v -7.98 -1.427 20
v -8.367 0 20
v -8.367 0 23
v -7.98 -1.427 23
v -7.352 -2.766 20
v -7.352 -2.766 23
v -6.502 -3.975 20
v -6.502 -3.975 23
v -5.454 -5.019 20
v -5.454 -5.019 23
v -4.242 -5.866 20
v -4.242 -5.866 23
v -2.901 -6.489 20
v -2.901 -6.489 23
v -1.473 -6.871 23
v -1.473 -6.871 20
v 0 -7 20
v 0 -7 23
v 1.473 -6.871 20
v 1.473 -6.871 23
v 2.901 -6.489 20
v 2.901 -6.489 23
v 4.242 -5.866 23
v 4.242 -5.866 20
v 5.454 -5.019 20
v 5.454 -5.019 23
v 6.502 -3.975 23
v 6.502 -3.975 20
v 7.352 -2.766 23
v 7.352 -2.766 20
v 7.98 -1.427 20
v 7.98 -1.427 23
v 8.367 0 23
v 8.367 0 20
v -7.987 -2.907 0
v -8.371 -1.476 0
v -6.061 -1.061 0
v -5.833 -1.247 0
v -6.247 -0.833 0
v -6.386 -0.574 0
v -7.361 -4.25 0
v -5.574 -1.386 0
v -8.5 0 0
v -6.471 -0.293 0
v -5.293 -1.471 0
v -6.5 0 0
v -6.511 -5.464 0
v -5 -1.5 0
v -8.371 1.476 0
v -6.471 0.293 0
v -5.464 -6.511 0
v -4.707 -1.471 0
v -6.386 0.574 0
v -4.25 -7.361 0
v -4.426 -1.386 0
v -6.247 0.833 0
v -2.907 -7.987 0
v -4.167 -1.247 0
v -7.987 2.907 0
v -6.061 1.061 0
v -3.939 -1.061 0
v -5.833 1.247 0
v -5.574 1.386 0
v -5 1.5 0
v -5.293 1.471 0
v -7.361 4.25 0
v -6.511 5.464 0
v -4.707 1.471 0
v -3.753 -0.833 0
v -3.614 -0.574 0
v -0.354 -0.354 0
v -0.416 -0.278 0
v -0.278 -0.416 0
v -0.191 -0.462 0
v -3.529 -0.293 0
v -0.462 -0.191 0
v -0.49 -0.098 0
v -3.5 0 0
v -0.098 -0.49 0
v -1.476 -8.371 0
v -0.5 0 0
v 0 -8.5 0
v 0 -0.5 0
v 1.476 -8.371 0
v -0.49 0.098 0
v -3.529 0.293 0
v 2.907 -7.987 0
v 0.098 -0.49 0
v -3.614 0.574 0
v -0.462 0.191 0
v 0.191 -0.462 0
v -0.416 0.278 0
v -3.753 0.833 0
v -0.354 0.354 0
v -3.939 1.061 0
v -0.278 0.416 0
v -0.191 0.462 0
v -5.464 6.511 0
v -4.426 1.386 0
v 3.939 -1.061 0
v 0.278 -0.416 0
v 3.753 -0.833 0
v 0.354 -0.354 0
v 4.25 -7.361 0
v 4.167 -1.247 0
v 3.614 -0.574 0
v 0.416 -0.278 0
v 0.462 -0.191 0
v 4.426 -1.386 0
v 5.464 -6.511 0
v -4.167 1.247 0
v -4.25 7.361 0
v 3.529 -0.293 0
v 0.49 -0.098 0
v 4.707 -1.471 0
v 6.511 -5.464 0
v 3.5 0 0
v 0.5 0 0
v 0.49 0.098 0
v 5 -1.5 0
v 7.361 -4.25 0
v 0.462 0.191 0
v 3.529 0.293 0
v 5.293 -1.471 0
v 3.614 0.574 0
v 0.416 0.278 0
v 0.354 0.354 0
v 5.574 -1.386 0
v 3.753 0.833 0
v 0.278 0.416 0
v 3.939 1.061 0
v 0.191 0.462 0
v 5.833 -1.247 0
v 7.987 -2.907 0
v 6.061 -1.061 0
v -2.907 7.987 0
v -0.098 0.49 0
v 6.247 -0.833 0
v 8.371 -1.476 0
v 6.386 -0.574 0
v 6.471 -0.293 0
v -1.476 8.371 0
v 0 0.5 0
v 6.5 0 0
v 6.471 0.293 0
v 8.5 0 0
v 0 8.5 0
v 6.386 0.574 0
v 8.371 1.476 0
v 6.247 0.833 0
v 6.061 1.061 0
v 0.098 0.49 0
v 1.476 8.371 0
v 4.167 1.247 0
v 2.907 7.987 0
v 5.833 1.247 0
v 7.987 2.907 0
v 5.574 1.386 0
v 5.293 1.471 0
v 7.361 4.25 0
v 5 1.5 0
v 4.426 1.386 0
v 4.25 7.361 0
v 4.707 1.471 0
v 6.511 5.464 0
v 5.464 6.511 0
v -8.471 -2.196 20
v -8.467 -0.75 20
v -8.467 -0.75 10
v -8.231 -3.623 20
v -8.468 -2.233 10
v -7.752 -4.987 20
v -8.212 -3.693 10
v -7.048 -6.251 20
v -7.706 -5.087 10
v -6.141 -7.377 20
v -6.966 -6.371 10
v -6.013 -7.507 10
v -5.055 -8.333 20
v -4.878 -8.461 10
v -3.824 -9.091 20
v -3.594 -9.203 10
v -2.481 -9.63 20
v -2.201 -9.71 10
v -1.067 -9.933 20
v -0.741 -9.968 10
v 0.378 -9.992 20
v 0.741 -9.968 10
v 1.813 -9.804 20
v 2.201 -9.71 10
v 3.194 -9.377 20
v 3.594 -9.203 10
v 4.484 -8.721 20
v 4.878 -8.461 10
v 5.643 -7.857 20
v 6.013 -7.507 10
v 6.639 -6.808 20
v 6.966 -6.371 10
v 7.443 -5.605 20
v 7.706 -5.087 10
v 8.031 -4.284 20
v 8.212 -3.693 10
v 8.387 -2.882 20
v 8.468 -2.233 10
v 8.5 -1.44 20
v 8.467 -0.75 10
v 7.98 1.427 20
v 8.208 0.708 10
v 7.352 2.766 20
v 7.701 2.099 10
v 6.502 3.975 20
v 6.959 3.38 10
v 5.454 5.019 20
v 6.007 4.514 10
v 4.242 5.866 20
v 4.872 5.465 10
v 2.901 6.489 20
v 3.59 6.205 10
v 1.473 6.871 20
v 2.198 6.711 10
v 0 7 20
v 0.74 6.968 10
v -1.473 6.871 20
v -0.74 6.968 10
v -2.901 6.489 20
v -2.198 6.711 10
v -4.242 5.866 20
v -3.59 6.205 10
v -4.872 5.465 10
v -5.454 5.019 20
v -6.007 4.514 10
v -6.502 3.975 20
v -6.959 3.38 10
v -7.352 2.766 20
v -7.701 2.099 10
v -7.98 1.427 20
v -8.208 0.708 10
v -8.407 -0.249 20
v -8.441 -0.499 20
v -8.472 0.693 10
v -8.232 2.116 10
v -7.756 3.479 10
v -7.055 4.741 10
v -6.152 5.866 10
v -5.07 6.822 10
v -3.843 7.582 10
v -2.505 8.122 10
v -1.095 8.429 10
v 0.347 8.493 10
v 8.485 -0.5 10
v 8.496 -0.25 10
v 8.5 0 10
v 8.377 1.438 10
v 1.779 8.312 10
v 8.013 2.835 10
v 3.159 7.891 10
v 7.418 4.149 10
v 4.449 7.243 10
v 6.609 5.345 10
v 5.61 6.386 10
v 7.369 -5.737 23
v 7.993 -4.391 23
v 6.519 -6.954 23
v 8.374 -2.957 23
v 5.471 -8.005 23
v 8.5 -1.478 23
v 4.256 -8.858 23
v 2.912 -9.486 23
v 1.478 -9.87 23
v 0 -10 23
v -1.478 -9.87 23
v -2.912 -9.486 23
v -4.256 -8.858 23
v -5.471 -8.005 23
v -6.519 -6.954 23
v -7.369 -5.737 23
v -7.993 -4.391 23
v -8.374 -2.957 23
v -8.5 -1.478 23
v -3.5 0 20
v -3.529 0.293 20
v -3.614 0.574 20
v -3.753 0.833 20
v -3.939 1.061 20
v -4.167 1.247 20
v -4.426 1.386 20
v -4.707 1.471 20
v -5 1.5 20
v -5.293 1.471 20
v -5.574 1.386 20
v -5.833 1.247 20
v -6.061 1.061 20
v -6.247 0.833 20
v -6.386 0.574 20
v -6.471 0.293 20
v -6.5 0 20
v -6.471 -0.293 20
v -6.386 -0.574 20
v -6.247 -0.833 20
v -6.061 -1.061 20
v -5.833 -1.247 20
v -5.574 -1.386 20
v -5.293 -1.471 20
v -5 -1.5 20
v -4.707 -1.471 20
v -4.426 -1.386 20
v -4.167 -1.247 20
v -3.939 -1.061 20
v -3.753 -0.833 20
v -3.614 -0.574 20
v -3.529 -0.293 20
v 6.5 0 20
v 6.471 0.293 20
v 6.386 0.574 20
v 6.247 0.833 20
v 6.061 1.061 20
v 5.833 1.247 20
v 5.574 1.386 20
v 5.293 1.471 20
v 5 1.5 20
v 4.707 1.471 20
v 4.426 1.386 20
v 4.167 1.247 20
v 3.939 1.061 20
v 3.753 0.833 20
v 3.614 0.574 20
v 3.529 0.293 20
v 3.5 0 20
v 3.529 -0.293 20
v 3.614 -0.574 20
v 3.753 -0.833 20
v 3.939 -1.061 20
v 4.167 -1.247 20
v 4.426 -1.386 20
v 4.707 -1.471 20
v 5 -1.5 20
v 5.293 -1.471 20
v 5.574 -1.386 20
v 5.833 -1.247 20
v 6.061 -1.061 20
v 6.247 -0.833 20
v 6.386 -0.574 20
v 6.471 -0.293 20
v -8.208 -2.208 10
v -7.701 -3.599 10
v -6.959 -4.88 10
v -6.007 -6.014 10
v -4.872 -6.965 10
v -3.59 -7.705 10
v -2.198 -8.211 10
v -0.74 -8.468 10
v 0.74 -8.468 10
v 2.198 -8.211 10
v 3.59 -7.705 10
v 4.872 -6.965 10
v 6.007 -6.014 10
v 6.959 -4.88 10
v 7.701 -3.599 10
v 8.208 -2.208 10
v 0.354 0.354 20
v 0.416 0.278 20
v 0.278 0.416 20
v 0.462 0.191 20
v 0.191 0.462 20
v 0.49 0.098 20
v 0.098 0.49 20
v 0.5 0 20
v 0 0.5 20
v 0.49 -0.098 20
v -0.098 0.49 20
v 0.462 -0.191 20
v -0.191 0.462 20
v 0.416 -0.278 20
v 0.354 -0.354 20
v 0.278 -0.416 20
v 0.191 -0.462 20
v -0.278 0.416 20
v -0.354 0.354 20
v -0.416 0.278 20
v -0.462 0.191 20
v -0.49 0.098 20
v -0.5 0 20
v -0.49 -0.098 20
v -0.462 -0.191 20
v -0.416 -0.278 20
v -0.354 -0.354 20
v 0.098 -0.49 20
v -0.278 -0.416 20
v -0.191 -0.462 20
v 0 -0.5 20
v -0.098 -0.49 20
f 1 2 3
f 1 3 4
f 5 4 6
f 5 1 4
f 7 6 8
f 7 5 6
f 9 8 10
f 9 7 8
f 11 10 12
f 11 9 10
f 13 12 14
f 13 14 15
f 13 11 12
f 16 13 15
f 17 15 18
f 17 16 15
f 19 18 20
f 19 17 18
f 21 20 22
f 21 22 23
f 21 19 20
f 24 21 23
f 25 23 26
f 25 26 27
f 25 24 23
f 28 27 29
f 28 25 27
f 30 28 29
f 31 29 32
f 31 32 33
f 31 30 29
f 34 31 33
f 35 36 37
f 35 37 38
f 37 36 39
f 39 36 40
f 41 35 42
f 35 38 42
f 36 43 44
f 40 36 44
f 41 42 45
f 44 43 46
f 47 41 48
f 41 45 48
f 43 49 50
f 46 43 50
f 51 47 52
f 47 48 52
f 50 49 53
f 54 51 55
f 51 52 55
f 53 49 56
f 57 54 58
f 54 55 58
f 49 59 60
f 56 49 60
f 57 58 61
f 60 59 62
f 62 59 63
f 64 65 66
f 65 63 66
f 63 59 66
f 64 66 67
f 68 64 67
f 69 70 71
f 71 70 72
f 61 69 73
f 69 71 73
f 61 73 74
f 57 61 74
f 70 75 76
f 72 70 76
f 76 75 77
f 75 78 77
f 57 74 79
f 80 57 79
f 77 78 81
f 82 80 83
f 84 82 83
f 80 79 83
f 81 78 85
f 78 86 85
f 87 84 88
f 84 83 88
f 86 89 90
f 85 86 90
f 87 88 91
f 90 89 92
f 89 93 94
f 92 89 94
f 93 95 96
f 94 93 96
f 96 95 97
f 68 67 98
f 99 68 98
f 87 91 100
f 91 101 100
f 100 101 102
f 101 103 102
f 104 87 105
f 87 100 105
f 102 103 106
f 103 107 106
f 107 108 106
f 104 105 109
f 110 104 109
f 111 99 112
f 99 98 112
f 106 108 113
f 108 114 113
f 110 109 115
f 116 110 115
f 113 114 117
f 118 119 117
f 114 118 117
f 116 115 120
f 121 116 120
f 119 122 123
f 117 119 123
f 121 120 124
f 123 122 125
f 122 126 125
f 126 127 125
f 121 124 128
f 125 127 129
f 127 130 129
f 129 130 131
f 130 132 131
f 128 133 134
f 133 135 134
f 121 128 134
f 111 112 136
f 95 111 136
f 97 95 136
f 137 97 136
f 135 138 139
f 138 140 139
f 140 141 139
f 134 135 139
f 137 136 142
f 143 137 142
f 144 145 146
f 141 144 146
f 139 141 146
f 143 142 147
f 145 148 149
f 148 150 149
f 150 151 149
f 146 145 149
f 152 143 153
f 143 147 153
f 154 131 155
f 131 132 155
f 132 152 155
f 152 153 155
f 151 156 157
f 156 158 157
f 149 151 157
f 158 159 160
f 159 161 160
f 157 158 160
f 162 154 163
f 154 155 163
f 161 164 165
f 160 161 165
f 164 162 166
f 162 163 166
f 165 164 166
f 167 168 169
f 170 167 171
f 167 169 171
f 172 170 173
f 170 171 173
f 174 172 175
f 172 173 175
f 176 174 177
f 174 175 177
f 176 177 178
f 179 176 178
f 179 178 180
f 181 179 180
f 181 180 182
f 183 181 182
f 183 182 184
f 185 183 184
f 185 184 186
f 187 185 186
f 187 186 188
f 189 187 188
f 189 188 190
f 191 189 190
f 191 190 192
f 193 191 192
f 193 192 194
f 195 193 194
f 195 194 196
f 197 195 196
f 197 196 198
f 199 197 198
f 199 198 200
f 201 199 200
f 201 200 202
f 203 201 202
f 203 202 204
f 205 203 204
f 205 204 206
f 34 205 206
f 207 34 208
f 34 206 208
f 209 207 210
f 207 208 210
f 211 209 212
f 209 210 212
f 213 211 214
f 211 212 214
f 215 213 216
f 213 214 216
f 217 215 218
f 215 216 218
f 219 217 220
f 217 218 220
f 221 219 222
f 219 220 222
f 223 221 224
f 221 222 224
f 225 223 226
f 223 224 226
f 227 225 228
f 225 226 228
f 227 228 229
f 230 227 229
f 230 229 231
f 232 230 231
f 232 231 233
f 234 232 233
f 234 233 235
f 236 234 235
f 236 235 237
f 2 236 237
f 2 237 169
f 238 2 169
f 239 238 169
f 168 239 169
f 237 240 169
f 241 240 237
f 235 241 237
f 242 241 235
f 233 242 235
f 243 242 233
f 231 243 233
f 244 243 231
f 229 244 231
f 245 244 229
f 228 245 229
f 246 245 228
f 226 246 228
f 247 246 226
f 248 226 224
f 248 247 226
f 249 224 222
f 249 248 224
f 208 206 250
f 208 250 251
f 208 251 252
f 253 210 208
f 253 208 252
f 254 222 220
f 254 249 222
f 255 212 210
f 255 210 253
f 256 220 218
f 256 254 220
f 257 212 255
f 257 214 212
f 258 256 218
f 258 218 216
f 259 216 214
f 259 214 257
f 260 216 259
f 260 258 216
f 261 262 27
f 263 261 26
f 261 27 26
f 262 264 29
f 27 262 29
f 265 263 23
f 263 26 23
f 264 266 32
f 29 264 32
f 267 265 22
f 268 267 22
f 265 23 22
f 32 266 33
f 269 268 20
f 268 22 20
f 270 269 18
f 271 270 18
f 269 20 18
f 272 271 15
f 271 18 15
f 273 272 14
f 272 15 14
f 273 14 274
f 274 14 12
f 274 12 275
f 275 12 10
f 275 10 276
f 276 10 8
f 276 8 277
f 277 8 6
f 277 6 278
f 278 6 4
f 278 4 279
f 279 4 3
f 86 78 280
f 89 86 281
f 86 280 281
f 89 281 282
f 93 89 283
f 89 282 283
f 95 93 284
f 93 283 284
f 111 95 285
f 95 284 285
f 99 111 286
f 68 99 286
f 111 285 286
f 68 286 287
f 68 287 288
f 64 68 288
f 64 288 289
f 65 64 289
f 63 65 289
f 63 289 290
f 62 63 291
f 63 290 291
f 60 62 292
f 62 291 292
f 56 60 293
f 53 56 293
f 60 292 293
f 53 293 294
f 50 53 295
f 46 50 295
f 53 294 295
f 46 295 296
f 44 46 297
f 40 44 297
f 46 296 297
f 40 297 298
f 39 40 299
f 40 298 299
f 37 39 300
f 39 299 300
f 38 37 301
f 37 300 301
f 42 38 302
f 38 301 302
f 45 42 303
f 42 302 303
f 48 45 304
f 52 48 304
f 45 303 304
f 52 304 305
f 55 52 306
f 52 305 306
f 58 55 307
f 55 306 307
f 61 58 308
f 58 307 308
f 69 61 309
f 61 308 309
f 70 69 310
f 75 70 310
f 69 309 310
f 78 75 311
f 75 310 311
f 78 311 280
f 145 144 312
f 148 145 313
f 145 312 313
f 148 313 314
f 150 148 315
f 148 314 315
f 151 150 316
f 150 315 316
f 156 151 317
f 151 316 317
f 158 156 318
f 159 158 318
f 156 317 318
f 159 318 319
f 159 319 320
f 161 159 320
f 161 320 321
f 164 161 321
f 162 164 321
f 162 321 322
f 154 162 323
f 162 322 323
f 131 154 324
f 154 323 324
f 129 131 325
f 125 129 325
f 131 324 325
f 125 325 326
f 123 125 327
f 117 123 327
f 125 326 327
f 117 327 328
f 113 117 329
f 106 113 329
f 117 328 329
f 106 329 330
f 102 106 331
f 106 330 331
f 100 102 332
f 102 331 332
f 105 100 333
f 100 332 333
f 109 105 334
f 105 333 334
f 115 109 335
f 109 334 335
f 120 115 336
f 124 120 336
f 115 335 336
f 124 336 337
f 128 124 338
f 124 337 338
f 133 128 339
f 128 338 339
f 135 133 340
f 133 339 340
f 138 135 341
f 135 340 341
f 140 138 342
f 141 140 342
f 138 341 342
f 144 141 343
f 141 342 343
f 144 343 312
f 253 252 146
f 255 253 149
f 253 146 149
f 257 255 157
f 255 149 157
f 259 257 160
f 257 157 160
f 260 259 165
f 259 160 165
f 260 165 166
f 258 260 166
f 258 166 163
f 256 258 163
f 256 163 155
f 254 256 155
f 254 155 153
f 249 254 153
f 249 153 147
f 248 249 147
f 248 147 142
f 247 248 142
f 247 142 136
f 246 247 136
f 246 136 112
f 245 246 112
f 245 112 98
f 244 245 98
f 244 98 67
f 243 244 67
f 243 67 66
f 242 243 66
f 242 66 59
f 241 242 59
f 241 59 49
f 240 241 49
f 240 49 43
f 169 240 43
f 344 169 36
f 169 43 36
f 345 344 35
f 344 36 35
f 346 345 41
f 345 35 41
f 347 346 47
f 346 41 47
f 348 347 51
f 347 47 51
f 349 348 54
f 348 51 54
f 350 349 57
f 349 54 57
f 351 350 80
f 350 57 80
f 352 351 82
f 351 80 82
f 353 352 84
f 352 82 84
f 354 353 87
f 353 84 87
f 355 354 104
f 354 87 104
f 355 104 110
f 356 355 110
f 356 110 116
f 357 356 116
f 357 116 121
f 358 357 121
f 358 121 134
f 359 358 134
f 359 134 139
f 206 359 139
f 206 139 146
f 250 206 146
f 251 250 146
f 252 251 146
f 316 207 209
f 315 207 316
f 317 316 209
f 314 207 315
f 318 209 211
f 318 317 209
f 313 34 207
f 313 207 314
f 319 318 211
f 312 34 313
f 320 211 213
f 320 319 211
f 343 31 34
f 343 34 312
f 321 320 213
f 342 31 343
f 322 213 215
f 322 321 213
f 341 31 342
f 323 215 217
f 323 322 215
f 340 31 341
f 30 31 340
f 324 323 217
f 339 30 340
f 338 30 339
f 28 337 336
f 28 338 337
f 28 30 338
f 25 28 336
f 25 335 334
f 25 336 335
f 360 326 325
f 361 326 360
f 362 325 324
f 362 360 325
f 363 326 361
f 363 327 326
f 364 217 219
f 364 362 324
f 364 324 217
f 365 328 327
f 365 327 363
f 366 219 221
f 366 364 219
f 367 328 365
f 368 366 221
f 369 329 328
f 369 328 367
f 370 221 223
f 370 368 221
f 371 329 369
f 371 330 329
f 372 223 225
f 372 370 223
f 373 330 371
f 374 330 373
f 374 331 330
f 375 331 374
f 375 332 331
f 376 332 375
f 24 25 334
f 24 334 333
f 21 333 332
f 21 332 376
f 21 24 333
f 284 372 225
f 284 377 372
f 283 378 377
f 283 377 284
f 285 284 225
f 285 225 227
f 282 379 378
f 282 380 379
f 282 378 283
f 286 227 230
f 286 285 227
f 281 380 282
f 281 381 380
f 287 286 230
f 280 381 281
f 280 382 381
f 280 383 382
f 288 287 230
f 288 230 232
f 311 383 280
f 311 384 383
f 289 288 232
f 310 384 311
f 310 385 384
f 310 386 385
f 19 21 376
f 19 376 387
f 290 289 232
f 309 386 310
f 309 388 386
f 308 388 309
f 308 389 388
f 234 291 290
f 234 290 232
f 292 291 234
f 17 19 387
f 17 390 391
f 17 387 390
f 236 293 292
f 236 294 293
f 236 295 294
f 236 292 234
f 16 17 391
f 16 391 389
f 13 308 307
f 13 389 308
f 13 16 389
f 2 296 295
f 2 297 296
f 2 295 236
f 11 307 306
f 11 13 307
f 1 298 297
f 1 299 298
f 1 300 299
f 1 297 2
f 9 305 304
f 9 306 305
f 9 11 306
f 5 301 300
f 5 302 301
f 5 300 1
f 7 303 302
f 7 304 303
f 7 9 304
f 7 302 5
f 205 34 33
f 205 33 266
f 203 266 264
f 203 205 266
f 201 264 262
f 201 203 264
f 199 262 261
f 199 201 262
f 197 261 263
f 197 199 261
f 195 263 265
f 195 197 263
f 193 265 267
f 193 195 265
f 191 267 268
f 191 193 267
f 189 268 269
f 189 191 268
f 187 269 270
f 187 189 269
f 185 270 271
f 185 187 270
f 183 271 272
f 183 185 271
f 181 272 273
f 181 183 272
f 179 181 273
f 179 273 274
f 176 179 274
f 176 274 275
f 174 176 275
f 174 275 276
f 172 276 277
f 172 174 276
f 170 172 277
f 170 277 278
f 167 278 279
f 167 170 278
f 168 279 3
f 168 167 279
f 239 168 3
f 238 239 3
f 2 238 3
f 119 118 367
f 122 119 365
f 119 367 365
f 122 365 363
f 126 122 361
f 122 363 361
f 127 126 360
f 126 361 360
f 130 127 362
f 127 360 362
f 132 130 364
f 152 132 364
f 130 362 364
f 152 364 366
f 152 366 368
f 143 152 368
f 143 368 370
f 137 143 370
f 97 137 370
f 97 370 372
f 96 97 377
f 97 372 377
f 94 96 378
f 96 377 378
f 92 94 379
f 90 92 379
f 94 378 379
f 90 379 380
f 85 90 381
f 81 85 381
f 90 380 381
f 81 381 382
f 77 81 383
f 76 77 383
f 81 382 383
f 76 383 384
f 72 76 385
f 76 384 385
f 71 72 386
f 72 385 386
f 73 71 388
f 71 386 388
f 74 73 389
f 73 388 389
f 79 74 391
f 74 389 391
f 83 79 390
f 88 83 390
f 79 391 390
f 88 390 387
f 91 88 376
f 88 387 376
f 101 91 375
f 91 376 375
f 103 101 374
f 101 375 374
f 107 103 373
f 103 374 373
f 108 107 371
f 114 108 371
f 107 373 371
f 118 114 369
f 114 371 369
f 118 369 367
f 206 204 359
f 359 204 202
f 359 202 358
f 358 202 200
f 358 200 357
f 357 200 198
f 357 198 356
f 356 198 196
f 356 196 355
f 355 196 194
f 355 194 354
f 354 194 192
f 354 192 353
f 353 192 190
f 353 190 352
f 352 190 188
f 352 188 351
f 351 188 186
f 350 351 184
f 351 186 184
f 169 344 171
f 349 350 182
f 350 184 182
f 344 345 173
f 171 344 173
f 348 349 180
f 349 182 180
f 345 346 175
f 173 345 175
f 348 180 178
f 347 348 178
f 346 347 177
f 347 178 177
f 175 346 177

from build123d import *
from build123d.topology import SkipClean

# Parameters (mm, degrees)
SKETCH1_R           = 8.5
BOSS_EXTRUDE1_DEPTH = 10
SKETCH2_R           = 8.5
BOSS_EXTRUDE2_DEPTH = 10
SKETCH4_R           = 0.5
SKETCH4_R_2         = 1.5
CUT_EXTRUDE1_DEPTH  = 20
BOSS_EXTRUDE3_DEPTH = 3


with BuildPart() as part:
    # Sketch1 → Boss-Extrude1 (new body)
    with BuildSketch(Plane.XY):
        Circle(SKETCH1_R)
    extrude(amount=BOSS_EXTRUDE1_DEPTH)

    # Sketch2 → Boss-Extrude2 (add)
    with BuildSketch(Plane.XY.offset(10)):
        with Locations(Location((0, -1.5, 0), (0, 0, 174.937907036))):
            Circle(SKETCH2_R)
    extrude(amount=BOSS_EXTRUDE2_DEPTH)

    # Sketch4 → Cut-Extrude1 (cut)
    with BuildSketch(Plane.XY.offset(20)):
        Circle(SKETCH4_R)
        with Locations((-5, 0)):
            Circle(SKETCH4_R_2)
        with Locations((5, 0)):
            Circle(SKETCH4_R_2)
    extrude(amount=-CUT_EXTRUDE1_DEPTH, mode=Mode.SUBTRACT)

    # Sketch5 → Boss-Extrude3 (add)
    with SkipClean():  # the faces are left unmerged after this step: merging them gives an invalid solid
        with BuildSketch(Plane.XY.offset(20)):
            with BuildLine():
                ThreePointArc((-8.366600265, 0), (0, -7), (8.366600265, 0))
                ThreePointArc((8.366600265, 0), (0, -10), (-8.366600265, 0))
            make_face()
        extrude(amount=BOSS_EXTRUDE3_DEPTH)


solid = part.part
